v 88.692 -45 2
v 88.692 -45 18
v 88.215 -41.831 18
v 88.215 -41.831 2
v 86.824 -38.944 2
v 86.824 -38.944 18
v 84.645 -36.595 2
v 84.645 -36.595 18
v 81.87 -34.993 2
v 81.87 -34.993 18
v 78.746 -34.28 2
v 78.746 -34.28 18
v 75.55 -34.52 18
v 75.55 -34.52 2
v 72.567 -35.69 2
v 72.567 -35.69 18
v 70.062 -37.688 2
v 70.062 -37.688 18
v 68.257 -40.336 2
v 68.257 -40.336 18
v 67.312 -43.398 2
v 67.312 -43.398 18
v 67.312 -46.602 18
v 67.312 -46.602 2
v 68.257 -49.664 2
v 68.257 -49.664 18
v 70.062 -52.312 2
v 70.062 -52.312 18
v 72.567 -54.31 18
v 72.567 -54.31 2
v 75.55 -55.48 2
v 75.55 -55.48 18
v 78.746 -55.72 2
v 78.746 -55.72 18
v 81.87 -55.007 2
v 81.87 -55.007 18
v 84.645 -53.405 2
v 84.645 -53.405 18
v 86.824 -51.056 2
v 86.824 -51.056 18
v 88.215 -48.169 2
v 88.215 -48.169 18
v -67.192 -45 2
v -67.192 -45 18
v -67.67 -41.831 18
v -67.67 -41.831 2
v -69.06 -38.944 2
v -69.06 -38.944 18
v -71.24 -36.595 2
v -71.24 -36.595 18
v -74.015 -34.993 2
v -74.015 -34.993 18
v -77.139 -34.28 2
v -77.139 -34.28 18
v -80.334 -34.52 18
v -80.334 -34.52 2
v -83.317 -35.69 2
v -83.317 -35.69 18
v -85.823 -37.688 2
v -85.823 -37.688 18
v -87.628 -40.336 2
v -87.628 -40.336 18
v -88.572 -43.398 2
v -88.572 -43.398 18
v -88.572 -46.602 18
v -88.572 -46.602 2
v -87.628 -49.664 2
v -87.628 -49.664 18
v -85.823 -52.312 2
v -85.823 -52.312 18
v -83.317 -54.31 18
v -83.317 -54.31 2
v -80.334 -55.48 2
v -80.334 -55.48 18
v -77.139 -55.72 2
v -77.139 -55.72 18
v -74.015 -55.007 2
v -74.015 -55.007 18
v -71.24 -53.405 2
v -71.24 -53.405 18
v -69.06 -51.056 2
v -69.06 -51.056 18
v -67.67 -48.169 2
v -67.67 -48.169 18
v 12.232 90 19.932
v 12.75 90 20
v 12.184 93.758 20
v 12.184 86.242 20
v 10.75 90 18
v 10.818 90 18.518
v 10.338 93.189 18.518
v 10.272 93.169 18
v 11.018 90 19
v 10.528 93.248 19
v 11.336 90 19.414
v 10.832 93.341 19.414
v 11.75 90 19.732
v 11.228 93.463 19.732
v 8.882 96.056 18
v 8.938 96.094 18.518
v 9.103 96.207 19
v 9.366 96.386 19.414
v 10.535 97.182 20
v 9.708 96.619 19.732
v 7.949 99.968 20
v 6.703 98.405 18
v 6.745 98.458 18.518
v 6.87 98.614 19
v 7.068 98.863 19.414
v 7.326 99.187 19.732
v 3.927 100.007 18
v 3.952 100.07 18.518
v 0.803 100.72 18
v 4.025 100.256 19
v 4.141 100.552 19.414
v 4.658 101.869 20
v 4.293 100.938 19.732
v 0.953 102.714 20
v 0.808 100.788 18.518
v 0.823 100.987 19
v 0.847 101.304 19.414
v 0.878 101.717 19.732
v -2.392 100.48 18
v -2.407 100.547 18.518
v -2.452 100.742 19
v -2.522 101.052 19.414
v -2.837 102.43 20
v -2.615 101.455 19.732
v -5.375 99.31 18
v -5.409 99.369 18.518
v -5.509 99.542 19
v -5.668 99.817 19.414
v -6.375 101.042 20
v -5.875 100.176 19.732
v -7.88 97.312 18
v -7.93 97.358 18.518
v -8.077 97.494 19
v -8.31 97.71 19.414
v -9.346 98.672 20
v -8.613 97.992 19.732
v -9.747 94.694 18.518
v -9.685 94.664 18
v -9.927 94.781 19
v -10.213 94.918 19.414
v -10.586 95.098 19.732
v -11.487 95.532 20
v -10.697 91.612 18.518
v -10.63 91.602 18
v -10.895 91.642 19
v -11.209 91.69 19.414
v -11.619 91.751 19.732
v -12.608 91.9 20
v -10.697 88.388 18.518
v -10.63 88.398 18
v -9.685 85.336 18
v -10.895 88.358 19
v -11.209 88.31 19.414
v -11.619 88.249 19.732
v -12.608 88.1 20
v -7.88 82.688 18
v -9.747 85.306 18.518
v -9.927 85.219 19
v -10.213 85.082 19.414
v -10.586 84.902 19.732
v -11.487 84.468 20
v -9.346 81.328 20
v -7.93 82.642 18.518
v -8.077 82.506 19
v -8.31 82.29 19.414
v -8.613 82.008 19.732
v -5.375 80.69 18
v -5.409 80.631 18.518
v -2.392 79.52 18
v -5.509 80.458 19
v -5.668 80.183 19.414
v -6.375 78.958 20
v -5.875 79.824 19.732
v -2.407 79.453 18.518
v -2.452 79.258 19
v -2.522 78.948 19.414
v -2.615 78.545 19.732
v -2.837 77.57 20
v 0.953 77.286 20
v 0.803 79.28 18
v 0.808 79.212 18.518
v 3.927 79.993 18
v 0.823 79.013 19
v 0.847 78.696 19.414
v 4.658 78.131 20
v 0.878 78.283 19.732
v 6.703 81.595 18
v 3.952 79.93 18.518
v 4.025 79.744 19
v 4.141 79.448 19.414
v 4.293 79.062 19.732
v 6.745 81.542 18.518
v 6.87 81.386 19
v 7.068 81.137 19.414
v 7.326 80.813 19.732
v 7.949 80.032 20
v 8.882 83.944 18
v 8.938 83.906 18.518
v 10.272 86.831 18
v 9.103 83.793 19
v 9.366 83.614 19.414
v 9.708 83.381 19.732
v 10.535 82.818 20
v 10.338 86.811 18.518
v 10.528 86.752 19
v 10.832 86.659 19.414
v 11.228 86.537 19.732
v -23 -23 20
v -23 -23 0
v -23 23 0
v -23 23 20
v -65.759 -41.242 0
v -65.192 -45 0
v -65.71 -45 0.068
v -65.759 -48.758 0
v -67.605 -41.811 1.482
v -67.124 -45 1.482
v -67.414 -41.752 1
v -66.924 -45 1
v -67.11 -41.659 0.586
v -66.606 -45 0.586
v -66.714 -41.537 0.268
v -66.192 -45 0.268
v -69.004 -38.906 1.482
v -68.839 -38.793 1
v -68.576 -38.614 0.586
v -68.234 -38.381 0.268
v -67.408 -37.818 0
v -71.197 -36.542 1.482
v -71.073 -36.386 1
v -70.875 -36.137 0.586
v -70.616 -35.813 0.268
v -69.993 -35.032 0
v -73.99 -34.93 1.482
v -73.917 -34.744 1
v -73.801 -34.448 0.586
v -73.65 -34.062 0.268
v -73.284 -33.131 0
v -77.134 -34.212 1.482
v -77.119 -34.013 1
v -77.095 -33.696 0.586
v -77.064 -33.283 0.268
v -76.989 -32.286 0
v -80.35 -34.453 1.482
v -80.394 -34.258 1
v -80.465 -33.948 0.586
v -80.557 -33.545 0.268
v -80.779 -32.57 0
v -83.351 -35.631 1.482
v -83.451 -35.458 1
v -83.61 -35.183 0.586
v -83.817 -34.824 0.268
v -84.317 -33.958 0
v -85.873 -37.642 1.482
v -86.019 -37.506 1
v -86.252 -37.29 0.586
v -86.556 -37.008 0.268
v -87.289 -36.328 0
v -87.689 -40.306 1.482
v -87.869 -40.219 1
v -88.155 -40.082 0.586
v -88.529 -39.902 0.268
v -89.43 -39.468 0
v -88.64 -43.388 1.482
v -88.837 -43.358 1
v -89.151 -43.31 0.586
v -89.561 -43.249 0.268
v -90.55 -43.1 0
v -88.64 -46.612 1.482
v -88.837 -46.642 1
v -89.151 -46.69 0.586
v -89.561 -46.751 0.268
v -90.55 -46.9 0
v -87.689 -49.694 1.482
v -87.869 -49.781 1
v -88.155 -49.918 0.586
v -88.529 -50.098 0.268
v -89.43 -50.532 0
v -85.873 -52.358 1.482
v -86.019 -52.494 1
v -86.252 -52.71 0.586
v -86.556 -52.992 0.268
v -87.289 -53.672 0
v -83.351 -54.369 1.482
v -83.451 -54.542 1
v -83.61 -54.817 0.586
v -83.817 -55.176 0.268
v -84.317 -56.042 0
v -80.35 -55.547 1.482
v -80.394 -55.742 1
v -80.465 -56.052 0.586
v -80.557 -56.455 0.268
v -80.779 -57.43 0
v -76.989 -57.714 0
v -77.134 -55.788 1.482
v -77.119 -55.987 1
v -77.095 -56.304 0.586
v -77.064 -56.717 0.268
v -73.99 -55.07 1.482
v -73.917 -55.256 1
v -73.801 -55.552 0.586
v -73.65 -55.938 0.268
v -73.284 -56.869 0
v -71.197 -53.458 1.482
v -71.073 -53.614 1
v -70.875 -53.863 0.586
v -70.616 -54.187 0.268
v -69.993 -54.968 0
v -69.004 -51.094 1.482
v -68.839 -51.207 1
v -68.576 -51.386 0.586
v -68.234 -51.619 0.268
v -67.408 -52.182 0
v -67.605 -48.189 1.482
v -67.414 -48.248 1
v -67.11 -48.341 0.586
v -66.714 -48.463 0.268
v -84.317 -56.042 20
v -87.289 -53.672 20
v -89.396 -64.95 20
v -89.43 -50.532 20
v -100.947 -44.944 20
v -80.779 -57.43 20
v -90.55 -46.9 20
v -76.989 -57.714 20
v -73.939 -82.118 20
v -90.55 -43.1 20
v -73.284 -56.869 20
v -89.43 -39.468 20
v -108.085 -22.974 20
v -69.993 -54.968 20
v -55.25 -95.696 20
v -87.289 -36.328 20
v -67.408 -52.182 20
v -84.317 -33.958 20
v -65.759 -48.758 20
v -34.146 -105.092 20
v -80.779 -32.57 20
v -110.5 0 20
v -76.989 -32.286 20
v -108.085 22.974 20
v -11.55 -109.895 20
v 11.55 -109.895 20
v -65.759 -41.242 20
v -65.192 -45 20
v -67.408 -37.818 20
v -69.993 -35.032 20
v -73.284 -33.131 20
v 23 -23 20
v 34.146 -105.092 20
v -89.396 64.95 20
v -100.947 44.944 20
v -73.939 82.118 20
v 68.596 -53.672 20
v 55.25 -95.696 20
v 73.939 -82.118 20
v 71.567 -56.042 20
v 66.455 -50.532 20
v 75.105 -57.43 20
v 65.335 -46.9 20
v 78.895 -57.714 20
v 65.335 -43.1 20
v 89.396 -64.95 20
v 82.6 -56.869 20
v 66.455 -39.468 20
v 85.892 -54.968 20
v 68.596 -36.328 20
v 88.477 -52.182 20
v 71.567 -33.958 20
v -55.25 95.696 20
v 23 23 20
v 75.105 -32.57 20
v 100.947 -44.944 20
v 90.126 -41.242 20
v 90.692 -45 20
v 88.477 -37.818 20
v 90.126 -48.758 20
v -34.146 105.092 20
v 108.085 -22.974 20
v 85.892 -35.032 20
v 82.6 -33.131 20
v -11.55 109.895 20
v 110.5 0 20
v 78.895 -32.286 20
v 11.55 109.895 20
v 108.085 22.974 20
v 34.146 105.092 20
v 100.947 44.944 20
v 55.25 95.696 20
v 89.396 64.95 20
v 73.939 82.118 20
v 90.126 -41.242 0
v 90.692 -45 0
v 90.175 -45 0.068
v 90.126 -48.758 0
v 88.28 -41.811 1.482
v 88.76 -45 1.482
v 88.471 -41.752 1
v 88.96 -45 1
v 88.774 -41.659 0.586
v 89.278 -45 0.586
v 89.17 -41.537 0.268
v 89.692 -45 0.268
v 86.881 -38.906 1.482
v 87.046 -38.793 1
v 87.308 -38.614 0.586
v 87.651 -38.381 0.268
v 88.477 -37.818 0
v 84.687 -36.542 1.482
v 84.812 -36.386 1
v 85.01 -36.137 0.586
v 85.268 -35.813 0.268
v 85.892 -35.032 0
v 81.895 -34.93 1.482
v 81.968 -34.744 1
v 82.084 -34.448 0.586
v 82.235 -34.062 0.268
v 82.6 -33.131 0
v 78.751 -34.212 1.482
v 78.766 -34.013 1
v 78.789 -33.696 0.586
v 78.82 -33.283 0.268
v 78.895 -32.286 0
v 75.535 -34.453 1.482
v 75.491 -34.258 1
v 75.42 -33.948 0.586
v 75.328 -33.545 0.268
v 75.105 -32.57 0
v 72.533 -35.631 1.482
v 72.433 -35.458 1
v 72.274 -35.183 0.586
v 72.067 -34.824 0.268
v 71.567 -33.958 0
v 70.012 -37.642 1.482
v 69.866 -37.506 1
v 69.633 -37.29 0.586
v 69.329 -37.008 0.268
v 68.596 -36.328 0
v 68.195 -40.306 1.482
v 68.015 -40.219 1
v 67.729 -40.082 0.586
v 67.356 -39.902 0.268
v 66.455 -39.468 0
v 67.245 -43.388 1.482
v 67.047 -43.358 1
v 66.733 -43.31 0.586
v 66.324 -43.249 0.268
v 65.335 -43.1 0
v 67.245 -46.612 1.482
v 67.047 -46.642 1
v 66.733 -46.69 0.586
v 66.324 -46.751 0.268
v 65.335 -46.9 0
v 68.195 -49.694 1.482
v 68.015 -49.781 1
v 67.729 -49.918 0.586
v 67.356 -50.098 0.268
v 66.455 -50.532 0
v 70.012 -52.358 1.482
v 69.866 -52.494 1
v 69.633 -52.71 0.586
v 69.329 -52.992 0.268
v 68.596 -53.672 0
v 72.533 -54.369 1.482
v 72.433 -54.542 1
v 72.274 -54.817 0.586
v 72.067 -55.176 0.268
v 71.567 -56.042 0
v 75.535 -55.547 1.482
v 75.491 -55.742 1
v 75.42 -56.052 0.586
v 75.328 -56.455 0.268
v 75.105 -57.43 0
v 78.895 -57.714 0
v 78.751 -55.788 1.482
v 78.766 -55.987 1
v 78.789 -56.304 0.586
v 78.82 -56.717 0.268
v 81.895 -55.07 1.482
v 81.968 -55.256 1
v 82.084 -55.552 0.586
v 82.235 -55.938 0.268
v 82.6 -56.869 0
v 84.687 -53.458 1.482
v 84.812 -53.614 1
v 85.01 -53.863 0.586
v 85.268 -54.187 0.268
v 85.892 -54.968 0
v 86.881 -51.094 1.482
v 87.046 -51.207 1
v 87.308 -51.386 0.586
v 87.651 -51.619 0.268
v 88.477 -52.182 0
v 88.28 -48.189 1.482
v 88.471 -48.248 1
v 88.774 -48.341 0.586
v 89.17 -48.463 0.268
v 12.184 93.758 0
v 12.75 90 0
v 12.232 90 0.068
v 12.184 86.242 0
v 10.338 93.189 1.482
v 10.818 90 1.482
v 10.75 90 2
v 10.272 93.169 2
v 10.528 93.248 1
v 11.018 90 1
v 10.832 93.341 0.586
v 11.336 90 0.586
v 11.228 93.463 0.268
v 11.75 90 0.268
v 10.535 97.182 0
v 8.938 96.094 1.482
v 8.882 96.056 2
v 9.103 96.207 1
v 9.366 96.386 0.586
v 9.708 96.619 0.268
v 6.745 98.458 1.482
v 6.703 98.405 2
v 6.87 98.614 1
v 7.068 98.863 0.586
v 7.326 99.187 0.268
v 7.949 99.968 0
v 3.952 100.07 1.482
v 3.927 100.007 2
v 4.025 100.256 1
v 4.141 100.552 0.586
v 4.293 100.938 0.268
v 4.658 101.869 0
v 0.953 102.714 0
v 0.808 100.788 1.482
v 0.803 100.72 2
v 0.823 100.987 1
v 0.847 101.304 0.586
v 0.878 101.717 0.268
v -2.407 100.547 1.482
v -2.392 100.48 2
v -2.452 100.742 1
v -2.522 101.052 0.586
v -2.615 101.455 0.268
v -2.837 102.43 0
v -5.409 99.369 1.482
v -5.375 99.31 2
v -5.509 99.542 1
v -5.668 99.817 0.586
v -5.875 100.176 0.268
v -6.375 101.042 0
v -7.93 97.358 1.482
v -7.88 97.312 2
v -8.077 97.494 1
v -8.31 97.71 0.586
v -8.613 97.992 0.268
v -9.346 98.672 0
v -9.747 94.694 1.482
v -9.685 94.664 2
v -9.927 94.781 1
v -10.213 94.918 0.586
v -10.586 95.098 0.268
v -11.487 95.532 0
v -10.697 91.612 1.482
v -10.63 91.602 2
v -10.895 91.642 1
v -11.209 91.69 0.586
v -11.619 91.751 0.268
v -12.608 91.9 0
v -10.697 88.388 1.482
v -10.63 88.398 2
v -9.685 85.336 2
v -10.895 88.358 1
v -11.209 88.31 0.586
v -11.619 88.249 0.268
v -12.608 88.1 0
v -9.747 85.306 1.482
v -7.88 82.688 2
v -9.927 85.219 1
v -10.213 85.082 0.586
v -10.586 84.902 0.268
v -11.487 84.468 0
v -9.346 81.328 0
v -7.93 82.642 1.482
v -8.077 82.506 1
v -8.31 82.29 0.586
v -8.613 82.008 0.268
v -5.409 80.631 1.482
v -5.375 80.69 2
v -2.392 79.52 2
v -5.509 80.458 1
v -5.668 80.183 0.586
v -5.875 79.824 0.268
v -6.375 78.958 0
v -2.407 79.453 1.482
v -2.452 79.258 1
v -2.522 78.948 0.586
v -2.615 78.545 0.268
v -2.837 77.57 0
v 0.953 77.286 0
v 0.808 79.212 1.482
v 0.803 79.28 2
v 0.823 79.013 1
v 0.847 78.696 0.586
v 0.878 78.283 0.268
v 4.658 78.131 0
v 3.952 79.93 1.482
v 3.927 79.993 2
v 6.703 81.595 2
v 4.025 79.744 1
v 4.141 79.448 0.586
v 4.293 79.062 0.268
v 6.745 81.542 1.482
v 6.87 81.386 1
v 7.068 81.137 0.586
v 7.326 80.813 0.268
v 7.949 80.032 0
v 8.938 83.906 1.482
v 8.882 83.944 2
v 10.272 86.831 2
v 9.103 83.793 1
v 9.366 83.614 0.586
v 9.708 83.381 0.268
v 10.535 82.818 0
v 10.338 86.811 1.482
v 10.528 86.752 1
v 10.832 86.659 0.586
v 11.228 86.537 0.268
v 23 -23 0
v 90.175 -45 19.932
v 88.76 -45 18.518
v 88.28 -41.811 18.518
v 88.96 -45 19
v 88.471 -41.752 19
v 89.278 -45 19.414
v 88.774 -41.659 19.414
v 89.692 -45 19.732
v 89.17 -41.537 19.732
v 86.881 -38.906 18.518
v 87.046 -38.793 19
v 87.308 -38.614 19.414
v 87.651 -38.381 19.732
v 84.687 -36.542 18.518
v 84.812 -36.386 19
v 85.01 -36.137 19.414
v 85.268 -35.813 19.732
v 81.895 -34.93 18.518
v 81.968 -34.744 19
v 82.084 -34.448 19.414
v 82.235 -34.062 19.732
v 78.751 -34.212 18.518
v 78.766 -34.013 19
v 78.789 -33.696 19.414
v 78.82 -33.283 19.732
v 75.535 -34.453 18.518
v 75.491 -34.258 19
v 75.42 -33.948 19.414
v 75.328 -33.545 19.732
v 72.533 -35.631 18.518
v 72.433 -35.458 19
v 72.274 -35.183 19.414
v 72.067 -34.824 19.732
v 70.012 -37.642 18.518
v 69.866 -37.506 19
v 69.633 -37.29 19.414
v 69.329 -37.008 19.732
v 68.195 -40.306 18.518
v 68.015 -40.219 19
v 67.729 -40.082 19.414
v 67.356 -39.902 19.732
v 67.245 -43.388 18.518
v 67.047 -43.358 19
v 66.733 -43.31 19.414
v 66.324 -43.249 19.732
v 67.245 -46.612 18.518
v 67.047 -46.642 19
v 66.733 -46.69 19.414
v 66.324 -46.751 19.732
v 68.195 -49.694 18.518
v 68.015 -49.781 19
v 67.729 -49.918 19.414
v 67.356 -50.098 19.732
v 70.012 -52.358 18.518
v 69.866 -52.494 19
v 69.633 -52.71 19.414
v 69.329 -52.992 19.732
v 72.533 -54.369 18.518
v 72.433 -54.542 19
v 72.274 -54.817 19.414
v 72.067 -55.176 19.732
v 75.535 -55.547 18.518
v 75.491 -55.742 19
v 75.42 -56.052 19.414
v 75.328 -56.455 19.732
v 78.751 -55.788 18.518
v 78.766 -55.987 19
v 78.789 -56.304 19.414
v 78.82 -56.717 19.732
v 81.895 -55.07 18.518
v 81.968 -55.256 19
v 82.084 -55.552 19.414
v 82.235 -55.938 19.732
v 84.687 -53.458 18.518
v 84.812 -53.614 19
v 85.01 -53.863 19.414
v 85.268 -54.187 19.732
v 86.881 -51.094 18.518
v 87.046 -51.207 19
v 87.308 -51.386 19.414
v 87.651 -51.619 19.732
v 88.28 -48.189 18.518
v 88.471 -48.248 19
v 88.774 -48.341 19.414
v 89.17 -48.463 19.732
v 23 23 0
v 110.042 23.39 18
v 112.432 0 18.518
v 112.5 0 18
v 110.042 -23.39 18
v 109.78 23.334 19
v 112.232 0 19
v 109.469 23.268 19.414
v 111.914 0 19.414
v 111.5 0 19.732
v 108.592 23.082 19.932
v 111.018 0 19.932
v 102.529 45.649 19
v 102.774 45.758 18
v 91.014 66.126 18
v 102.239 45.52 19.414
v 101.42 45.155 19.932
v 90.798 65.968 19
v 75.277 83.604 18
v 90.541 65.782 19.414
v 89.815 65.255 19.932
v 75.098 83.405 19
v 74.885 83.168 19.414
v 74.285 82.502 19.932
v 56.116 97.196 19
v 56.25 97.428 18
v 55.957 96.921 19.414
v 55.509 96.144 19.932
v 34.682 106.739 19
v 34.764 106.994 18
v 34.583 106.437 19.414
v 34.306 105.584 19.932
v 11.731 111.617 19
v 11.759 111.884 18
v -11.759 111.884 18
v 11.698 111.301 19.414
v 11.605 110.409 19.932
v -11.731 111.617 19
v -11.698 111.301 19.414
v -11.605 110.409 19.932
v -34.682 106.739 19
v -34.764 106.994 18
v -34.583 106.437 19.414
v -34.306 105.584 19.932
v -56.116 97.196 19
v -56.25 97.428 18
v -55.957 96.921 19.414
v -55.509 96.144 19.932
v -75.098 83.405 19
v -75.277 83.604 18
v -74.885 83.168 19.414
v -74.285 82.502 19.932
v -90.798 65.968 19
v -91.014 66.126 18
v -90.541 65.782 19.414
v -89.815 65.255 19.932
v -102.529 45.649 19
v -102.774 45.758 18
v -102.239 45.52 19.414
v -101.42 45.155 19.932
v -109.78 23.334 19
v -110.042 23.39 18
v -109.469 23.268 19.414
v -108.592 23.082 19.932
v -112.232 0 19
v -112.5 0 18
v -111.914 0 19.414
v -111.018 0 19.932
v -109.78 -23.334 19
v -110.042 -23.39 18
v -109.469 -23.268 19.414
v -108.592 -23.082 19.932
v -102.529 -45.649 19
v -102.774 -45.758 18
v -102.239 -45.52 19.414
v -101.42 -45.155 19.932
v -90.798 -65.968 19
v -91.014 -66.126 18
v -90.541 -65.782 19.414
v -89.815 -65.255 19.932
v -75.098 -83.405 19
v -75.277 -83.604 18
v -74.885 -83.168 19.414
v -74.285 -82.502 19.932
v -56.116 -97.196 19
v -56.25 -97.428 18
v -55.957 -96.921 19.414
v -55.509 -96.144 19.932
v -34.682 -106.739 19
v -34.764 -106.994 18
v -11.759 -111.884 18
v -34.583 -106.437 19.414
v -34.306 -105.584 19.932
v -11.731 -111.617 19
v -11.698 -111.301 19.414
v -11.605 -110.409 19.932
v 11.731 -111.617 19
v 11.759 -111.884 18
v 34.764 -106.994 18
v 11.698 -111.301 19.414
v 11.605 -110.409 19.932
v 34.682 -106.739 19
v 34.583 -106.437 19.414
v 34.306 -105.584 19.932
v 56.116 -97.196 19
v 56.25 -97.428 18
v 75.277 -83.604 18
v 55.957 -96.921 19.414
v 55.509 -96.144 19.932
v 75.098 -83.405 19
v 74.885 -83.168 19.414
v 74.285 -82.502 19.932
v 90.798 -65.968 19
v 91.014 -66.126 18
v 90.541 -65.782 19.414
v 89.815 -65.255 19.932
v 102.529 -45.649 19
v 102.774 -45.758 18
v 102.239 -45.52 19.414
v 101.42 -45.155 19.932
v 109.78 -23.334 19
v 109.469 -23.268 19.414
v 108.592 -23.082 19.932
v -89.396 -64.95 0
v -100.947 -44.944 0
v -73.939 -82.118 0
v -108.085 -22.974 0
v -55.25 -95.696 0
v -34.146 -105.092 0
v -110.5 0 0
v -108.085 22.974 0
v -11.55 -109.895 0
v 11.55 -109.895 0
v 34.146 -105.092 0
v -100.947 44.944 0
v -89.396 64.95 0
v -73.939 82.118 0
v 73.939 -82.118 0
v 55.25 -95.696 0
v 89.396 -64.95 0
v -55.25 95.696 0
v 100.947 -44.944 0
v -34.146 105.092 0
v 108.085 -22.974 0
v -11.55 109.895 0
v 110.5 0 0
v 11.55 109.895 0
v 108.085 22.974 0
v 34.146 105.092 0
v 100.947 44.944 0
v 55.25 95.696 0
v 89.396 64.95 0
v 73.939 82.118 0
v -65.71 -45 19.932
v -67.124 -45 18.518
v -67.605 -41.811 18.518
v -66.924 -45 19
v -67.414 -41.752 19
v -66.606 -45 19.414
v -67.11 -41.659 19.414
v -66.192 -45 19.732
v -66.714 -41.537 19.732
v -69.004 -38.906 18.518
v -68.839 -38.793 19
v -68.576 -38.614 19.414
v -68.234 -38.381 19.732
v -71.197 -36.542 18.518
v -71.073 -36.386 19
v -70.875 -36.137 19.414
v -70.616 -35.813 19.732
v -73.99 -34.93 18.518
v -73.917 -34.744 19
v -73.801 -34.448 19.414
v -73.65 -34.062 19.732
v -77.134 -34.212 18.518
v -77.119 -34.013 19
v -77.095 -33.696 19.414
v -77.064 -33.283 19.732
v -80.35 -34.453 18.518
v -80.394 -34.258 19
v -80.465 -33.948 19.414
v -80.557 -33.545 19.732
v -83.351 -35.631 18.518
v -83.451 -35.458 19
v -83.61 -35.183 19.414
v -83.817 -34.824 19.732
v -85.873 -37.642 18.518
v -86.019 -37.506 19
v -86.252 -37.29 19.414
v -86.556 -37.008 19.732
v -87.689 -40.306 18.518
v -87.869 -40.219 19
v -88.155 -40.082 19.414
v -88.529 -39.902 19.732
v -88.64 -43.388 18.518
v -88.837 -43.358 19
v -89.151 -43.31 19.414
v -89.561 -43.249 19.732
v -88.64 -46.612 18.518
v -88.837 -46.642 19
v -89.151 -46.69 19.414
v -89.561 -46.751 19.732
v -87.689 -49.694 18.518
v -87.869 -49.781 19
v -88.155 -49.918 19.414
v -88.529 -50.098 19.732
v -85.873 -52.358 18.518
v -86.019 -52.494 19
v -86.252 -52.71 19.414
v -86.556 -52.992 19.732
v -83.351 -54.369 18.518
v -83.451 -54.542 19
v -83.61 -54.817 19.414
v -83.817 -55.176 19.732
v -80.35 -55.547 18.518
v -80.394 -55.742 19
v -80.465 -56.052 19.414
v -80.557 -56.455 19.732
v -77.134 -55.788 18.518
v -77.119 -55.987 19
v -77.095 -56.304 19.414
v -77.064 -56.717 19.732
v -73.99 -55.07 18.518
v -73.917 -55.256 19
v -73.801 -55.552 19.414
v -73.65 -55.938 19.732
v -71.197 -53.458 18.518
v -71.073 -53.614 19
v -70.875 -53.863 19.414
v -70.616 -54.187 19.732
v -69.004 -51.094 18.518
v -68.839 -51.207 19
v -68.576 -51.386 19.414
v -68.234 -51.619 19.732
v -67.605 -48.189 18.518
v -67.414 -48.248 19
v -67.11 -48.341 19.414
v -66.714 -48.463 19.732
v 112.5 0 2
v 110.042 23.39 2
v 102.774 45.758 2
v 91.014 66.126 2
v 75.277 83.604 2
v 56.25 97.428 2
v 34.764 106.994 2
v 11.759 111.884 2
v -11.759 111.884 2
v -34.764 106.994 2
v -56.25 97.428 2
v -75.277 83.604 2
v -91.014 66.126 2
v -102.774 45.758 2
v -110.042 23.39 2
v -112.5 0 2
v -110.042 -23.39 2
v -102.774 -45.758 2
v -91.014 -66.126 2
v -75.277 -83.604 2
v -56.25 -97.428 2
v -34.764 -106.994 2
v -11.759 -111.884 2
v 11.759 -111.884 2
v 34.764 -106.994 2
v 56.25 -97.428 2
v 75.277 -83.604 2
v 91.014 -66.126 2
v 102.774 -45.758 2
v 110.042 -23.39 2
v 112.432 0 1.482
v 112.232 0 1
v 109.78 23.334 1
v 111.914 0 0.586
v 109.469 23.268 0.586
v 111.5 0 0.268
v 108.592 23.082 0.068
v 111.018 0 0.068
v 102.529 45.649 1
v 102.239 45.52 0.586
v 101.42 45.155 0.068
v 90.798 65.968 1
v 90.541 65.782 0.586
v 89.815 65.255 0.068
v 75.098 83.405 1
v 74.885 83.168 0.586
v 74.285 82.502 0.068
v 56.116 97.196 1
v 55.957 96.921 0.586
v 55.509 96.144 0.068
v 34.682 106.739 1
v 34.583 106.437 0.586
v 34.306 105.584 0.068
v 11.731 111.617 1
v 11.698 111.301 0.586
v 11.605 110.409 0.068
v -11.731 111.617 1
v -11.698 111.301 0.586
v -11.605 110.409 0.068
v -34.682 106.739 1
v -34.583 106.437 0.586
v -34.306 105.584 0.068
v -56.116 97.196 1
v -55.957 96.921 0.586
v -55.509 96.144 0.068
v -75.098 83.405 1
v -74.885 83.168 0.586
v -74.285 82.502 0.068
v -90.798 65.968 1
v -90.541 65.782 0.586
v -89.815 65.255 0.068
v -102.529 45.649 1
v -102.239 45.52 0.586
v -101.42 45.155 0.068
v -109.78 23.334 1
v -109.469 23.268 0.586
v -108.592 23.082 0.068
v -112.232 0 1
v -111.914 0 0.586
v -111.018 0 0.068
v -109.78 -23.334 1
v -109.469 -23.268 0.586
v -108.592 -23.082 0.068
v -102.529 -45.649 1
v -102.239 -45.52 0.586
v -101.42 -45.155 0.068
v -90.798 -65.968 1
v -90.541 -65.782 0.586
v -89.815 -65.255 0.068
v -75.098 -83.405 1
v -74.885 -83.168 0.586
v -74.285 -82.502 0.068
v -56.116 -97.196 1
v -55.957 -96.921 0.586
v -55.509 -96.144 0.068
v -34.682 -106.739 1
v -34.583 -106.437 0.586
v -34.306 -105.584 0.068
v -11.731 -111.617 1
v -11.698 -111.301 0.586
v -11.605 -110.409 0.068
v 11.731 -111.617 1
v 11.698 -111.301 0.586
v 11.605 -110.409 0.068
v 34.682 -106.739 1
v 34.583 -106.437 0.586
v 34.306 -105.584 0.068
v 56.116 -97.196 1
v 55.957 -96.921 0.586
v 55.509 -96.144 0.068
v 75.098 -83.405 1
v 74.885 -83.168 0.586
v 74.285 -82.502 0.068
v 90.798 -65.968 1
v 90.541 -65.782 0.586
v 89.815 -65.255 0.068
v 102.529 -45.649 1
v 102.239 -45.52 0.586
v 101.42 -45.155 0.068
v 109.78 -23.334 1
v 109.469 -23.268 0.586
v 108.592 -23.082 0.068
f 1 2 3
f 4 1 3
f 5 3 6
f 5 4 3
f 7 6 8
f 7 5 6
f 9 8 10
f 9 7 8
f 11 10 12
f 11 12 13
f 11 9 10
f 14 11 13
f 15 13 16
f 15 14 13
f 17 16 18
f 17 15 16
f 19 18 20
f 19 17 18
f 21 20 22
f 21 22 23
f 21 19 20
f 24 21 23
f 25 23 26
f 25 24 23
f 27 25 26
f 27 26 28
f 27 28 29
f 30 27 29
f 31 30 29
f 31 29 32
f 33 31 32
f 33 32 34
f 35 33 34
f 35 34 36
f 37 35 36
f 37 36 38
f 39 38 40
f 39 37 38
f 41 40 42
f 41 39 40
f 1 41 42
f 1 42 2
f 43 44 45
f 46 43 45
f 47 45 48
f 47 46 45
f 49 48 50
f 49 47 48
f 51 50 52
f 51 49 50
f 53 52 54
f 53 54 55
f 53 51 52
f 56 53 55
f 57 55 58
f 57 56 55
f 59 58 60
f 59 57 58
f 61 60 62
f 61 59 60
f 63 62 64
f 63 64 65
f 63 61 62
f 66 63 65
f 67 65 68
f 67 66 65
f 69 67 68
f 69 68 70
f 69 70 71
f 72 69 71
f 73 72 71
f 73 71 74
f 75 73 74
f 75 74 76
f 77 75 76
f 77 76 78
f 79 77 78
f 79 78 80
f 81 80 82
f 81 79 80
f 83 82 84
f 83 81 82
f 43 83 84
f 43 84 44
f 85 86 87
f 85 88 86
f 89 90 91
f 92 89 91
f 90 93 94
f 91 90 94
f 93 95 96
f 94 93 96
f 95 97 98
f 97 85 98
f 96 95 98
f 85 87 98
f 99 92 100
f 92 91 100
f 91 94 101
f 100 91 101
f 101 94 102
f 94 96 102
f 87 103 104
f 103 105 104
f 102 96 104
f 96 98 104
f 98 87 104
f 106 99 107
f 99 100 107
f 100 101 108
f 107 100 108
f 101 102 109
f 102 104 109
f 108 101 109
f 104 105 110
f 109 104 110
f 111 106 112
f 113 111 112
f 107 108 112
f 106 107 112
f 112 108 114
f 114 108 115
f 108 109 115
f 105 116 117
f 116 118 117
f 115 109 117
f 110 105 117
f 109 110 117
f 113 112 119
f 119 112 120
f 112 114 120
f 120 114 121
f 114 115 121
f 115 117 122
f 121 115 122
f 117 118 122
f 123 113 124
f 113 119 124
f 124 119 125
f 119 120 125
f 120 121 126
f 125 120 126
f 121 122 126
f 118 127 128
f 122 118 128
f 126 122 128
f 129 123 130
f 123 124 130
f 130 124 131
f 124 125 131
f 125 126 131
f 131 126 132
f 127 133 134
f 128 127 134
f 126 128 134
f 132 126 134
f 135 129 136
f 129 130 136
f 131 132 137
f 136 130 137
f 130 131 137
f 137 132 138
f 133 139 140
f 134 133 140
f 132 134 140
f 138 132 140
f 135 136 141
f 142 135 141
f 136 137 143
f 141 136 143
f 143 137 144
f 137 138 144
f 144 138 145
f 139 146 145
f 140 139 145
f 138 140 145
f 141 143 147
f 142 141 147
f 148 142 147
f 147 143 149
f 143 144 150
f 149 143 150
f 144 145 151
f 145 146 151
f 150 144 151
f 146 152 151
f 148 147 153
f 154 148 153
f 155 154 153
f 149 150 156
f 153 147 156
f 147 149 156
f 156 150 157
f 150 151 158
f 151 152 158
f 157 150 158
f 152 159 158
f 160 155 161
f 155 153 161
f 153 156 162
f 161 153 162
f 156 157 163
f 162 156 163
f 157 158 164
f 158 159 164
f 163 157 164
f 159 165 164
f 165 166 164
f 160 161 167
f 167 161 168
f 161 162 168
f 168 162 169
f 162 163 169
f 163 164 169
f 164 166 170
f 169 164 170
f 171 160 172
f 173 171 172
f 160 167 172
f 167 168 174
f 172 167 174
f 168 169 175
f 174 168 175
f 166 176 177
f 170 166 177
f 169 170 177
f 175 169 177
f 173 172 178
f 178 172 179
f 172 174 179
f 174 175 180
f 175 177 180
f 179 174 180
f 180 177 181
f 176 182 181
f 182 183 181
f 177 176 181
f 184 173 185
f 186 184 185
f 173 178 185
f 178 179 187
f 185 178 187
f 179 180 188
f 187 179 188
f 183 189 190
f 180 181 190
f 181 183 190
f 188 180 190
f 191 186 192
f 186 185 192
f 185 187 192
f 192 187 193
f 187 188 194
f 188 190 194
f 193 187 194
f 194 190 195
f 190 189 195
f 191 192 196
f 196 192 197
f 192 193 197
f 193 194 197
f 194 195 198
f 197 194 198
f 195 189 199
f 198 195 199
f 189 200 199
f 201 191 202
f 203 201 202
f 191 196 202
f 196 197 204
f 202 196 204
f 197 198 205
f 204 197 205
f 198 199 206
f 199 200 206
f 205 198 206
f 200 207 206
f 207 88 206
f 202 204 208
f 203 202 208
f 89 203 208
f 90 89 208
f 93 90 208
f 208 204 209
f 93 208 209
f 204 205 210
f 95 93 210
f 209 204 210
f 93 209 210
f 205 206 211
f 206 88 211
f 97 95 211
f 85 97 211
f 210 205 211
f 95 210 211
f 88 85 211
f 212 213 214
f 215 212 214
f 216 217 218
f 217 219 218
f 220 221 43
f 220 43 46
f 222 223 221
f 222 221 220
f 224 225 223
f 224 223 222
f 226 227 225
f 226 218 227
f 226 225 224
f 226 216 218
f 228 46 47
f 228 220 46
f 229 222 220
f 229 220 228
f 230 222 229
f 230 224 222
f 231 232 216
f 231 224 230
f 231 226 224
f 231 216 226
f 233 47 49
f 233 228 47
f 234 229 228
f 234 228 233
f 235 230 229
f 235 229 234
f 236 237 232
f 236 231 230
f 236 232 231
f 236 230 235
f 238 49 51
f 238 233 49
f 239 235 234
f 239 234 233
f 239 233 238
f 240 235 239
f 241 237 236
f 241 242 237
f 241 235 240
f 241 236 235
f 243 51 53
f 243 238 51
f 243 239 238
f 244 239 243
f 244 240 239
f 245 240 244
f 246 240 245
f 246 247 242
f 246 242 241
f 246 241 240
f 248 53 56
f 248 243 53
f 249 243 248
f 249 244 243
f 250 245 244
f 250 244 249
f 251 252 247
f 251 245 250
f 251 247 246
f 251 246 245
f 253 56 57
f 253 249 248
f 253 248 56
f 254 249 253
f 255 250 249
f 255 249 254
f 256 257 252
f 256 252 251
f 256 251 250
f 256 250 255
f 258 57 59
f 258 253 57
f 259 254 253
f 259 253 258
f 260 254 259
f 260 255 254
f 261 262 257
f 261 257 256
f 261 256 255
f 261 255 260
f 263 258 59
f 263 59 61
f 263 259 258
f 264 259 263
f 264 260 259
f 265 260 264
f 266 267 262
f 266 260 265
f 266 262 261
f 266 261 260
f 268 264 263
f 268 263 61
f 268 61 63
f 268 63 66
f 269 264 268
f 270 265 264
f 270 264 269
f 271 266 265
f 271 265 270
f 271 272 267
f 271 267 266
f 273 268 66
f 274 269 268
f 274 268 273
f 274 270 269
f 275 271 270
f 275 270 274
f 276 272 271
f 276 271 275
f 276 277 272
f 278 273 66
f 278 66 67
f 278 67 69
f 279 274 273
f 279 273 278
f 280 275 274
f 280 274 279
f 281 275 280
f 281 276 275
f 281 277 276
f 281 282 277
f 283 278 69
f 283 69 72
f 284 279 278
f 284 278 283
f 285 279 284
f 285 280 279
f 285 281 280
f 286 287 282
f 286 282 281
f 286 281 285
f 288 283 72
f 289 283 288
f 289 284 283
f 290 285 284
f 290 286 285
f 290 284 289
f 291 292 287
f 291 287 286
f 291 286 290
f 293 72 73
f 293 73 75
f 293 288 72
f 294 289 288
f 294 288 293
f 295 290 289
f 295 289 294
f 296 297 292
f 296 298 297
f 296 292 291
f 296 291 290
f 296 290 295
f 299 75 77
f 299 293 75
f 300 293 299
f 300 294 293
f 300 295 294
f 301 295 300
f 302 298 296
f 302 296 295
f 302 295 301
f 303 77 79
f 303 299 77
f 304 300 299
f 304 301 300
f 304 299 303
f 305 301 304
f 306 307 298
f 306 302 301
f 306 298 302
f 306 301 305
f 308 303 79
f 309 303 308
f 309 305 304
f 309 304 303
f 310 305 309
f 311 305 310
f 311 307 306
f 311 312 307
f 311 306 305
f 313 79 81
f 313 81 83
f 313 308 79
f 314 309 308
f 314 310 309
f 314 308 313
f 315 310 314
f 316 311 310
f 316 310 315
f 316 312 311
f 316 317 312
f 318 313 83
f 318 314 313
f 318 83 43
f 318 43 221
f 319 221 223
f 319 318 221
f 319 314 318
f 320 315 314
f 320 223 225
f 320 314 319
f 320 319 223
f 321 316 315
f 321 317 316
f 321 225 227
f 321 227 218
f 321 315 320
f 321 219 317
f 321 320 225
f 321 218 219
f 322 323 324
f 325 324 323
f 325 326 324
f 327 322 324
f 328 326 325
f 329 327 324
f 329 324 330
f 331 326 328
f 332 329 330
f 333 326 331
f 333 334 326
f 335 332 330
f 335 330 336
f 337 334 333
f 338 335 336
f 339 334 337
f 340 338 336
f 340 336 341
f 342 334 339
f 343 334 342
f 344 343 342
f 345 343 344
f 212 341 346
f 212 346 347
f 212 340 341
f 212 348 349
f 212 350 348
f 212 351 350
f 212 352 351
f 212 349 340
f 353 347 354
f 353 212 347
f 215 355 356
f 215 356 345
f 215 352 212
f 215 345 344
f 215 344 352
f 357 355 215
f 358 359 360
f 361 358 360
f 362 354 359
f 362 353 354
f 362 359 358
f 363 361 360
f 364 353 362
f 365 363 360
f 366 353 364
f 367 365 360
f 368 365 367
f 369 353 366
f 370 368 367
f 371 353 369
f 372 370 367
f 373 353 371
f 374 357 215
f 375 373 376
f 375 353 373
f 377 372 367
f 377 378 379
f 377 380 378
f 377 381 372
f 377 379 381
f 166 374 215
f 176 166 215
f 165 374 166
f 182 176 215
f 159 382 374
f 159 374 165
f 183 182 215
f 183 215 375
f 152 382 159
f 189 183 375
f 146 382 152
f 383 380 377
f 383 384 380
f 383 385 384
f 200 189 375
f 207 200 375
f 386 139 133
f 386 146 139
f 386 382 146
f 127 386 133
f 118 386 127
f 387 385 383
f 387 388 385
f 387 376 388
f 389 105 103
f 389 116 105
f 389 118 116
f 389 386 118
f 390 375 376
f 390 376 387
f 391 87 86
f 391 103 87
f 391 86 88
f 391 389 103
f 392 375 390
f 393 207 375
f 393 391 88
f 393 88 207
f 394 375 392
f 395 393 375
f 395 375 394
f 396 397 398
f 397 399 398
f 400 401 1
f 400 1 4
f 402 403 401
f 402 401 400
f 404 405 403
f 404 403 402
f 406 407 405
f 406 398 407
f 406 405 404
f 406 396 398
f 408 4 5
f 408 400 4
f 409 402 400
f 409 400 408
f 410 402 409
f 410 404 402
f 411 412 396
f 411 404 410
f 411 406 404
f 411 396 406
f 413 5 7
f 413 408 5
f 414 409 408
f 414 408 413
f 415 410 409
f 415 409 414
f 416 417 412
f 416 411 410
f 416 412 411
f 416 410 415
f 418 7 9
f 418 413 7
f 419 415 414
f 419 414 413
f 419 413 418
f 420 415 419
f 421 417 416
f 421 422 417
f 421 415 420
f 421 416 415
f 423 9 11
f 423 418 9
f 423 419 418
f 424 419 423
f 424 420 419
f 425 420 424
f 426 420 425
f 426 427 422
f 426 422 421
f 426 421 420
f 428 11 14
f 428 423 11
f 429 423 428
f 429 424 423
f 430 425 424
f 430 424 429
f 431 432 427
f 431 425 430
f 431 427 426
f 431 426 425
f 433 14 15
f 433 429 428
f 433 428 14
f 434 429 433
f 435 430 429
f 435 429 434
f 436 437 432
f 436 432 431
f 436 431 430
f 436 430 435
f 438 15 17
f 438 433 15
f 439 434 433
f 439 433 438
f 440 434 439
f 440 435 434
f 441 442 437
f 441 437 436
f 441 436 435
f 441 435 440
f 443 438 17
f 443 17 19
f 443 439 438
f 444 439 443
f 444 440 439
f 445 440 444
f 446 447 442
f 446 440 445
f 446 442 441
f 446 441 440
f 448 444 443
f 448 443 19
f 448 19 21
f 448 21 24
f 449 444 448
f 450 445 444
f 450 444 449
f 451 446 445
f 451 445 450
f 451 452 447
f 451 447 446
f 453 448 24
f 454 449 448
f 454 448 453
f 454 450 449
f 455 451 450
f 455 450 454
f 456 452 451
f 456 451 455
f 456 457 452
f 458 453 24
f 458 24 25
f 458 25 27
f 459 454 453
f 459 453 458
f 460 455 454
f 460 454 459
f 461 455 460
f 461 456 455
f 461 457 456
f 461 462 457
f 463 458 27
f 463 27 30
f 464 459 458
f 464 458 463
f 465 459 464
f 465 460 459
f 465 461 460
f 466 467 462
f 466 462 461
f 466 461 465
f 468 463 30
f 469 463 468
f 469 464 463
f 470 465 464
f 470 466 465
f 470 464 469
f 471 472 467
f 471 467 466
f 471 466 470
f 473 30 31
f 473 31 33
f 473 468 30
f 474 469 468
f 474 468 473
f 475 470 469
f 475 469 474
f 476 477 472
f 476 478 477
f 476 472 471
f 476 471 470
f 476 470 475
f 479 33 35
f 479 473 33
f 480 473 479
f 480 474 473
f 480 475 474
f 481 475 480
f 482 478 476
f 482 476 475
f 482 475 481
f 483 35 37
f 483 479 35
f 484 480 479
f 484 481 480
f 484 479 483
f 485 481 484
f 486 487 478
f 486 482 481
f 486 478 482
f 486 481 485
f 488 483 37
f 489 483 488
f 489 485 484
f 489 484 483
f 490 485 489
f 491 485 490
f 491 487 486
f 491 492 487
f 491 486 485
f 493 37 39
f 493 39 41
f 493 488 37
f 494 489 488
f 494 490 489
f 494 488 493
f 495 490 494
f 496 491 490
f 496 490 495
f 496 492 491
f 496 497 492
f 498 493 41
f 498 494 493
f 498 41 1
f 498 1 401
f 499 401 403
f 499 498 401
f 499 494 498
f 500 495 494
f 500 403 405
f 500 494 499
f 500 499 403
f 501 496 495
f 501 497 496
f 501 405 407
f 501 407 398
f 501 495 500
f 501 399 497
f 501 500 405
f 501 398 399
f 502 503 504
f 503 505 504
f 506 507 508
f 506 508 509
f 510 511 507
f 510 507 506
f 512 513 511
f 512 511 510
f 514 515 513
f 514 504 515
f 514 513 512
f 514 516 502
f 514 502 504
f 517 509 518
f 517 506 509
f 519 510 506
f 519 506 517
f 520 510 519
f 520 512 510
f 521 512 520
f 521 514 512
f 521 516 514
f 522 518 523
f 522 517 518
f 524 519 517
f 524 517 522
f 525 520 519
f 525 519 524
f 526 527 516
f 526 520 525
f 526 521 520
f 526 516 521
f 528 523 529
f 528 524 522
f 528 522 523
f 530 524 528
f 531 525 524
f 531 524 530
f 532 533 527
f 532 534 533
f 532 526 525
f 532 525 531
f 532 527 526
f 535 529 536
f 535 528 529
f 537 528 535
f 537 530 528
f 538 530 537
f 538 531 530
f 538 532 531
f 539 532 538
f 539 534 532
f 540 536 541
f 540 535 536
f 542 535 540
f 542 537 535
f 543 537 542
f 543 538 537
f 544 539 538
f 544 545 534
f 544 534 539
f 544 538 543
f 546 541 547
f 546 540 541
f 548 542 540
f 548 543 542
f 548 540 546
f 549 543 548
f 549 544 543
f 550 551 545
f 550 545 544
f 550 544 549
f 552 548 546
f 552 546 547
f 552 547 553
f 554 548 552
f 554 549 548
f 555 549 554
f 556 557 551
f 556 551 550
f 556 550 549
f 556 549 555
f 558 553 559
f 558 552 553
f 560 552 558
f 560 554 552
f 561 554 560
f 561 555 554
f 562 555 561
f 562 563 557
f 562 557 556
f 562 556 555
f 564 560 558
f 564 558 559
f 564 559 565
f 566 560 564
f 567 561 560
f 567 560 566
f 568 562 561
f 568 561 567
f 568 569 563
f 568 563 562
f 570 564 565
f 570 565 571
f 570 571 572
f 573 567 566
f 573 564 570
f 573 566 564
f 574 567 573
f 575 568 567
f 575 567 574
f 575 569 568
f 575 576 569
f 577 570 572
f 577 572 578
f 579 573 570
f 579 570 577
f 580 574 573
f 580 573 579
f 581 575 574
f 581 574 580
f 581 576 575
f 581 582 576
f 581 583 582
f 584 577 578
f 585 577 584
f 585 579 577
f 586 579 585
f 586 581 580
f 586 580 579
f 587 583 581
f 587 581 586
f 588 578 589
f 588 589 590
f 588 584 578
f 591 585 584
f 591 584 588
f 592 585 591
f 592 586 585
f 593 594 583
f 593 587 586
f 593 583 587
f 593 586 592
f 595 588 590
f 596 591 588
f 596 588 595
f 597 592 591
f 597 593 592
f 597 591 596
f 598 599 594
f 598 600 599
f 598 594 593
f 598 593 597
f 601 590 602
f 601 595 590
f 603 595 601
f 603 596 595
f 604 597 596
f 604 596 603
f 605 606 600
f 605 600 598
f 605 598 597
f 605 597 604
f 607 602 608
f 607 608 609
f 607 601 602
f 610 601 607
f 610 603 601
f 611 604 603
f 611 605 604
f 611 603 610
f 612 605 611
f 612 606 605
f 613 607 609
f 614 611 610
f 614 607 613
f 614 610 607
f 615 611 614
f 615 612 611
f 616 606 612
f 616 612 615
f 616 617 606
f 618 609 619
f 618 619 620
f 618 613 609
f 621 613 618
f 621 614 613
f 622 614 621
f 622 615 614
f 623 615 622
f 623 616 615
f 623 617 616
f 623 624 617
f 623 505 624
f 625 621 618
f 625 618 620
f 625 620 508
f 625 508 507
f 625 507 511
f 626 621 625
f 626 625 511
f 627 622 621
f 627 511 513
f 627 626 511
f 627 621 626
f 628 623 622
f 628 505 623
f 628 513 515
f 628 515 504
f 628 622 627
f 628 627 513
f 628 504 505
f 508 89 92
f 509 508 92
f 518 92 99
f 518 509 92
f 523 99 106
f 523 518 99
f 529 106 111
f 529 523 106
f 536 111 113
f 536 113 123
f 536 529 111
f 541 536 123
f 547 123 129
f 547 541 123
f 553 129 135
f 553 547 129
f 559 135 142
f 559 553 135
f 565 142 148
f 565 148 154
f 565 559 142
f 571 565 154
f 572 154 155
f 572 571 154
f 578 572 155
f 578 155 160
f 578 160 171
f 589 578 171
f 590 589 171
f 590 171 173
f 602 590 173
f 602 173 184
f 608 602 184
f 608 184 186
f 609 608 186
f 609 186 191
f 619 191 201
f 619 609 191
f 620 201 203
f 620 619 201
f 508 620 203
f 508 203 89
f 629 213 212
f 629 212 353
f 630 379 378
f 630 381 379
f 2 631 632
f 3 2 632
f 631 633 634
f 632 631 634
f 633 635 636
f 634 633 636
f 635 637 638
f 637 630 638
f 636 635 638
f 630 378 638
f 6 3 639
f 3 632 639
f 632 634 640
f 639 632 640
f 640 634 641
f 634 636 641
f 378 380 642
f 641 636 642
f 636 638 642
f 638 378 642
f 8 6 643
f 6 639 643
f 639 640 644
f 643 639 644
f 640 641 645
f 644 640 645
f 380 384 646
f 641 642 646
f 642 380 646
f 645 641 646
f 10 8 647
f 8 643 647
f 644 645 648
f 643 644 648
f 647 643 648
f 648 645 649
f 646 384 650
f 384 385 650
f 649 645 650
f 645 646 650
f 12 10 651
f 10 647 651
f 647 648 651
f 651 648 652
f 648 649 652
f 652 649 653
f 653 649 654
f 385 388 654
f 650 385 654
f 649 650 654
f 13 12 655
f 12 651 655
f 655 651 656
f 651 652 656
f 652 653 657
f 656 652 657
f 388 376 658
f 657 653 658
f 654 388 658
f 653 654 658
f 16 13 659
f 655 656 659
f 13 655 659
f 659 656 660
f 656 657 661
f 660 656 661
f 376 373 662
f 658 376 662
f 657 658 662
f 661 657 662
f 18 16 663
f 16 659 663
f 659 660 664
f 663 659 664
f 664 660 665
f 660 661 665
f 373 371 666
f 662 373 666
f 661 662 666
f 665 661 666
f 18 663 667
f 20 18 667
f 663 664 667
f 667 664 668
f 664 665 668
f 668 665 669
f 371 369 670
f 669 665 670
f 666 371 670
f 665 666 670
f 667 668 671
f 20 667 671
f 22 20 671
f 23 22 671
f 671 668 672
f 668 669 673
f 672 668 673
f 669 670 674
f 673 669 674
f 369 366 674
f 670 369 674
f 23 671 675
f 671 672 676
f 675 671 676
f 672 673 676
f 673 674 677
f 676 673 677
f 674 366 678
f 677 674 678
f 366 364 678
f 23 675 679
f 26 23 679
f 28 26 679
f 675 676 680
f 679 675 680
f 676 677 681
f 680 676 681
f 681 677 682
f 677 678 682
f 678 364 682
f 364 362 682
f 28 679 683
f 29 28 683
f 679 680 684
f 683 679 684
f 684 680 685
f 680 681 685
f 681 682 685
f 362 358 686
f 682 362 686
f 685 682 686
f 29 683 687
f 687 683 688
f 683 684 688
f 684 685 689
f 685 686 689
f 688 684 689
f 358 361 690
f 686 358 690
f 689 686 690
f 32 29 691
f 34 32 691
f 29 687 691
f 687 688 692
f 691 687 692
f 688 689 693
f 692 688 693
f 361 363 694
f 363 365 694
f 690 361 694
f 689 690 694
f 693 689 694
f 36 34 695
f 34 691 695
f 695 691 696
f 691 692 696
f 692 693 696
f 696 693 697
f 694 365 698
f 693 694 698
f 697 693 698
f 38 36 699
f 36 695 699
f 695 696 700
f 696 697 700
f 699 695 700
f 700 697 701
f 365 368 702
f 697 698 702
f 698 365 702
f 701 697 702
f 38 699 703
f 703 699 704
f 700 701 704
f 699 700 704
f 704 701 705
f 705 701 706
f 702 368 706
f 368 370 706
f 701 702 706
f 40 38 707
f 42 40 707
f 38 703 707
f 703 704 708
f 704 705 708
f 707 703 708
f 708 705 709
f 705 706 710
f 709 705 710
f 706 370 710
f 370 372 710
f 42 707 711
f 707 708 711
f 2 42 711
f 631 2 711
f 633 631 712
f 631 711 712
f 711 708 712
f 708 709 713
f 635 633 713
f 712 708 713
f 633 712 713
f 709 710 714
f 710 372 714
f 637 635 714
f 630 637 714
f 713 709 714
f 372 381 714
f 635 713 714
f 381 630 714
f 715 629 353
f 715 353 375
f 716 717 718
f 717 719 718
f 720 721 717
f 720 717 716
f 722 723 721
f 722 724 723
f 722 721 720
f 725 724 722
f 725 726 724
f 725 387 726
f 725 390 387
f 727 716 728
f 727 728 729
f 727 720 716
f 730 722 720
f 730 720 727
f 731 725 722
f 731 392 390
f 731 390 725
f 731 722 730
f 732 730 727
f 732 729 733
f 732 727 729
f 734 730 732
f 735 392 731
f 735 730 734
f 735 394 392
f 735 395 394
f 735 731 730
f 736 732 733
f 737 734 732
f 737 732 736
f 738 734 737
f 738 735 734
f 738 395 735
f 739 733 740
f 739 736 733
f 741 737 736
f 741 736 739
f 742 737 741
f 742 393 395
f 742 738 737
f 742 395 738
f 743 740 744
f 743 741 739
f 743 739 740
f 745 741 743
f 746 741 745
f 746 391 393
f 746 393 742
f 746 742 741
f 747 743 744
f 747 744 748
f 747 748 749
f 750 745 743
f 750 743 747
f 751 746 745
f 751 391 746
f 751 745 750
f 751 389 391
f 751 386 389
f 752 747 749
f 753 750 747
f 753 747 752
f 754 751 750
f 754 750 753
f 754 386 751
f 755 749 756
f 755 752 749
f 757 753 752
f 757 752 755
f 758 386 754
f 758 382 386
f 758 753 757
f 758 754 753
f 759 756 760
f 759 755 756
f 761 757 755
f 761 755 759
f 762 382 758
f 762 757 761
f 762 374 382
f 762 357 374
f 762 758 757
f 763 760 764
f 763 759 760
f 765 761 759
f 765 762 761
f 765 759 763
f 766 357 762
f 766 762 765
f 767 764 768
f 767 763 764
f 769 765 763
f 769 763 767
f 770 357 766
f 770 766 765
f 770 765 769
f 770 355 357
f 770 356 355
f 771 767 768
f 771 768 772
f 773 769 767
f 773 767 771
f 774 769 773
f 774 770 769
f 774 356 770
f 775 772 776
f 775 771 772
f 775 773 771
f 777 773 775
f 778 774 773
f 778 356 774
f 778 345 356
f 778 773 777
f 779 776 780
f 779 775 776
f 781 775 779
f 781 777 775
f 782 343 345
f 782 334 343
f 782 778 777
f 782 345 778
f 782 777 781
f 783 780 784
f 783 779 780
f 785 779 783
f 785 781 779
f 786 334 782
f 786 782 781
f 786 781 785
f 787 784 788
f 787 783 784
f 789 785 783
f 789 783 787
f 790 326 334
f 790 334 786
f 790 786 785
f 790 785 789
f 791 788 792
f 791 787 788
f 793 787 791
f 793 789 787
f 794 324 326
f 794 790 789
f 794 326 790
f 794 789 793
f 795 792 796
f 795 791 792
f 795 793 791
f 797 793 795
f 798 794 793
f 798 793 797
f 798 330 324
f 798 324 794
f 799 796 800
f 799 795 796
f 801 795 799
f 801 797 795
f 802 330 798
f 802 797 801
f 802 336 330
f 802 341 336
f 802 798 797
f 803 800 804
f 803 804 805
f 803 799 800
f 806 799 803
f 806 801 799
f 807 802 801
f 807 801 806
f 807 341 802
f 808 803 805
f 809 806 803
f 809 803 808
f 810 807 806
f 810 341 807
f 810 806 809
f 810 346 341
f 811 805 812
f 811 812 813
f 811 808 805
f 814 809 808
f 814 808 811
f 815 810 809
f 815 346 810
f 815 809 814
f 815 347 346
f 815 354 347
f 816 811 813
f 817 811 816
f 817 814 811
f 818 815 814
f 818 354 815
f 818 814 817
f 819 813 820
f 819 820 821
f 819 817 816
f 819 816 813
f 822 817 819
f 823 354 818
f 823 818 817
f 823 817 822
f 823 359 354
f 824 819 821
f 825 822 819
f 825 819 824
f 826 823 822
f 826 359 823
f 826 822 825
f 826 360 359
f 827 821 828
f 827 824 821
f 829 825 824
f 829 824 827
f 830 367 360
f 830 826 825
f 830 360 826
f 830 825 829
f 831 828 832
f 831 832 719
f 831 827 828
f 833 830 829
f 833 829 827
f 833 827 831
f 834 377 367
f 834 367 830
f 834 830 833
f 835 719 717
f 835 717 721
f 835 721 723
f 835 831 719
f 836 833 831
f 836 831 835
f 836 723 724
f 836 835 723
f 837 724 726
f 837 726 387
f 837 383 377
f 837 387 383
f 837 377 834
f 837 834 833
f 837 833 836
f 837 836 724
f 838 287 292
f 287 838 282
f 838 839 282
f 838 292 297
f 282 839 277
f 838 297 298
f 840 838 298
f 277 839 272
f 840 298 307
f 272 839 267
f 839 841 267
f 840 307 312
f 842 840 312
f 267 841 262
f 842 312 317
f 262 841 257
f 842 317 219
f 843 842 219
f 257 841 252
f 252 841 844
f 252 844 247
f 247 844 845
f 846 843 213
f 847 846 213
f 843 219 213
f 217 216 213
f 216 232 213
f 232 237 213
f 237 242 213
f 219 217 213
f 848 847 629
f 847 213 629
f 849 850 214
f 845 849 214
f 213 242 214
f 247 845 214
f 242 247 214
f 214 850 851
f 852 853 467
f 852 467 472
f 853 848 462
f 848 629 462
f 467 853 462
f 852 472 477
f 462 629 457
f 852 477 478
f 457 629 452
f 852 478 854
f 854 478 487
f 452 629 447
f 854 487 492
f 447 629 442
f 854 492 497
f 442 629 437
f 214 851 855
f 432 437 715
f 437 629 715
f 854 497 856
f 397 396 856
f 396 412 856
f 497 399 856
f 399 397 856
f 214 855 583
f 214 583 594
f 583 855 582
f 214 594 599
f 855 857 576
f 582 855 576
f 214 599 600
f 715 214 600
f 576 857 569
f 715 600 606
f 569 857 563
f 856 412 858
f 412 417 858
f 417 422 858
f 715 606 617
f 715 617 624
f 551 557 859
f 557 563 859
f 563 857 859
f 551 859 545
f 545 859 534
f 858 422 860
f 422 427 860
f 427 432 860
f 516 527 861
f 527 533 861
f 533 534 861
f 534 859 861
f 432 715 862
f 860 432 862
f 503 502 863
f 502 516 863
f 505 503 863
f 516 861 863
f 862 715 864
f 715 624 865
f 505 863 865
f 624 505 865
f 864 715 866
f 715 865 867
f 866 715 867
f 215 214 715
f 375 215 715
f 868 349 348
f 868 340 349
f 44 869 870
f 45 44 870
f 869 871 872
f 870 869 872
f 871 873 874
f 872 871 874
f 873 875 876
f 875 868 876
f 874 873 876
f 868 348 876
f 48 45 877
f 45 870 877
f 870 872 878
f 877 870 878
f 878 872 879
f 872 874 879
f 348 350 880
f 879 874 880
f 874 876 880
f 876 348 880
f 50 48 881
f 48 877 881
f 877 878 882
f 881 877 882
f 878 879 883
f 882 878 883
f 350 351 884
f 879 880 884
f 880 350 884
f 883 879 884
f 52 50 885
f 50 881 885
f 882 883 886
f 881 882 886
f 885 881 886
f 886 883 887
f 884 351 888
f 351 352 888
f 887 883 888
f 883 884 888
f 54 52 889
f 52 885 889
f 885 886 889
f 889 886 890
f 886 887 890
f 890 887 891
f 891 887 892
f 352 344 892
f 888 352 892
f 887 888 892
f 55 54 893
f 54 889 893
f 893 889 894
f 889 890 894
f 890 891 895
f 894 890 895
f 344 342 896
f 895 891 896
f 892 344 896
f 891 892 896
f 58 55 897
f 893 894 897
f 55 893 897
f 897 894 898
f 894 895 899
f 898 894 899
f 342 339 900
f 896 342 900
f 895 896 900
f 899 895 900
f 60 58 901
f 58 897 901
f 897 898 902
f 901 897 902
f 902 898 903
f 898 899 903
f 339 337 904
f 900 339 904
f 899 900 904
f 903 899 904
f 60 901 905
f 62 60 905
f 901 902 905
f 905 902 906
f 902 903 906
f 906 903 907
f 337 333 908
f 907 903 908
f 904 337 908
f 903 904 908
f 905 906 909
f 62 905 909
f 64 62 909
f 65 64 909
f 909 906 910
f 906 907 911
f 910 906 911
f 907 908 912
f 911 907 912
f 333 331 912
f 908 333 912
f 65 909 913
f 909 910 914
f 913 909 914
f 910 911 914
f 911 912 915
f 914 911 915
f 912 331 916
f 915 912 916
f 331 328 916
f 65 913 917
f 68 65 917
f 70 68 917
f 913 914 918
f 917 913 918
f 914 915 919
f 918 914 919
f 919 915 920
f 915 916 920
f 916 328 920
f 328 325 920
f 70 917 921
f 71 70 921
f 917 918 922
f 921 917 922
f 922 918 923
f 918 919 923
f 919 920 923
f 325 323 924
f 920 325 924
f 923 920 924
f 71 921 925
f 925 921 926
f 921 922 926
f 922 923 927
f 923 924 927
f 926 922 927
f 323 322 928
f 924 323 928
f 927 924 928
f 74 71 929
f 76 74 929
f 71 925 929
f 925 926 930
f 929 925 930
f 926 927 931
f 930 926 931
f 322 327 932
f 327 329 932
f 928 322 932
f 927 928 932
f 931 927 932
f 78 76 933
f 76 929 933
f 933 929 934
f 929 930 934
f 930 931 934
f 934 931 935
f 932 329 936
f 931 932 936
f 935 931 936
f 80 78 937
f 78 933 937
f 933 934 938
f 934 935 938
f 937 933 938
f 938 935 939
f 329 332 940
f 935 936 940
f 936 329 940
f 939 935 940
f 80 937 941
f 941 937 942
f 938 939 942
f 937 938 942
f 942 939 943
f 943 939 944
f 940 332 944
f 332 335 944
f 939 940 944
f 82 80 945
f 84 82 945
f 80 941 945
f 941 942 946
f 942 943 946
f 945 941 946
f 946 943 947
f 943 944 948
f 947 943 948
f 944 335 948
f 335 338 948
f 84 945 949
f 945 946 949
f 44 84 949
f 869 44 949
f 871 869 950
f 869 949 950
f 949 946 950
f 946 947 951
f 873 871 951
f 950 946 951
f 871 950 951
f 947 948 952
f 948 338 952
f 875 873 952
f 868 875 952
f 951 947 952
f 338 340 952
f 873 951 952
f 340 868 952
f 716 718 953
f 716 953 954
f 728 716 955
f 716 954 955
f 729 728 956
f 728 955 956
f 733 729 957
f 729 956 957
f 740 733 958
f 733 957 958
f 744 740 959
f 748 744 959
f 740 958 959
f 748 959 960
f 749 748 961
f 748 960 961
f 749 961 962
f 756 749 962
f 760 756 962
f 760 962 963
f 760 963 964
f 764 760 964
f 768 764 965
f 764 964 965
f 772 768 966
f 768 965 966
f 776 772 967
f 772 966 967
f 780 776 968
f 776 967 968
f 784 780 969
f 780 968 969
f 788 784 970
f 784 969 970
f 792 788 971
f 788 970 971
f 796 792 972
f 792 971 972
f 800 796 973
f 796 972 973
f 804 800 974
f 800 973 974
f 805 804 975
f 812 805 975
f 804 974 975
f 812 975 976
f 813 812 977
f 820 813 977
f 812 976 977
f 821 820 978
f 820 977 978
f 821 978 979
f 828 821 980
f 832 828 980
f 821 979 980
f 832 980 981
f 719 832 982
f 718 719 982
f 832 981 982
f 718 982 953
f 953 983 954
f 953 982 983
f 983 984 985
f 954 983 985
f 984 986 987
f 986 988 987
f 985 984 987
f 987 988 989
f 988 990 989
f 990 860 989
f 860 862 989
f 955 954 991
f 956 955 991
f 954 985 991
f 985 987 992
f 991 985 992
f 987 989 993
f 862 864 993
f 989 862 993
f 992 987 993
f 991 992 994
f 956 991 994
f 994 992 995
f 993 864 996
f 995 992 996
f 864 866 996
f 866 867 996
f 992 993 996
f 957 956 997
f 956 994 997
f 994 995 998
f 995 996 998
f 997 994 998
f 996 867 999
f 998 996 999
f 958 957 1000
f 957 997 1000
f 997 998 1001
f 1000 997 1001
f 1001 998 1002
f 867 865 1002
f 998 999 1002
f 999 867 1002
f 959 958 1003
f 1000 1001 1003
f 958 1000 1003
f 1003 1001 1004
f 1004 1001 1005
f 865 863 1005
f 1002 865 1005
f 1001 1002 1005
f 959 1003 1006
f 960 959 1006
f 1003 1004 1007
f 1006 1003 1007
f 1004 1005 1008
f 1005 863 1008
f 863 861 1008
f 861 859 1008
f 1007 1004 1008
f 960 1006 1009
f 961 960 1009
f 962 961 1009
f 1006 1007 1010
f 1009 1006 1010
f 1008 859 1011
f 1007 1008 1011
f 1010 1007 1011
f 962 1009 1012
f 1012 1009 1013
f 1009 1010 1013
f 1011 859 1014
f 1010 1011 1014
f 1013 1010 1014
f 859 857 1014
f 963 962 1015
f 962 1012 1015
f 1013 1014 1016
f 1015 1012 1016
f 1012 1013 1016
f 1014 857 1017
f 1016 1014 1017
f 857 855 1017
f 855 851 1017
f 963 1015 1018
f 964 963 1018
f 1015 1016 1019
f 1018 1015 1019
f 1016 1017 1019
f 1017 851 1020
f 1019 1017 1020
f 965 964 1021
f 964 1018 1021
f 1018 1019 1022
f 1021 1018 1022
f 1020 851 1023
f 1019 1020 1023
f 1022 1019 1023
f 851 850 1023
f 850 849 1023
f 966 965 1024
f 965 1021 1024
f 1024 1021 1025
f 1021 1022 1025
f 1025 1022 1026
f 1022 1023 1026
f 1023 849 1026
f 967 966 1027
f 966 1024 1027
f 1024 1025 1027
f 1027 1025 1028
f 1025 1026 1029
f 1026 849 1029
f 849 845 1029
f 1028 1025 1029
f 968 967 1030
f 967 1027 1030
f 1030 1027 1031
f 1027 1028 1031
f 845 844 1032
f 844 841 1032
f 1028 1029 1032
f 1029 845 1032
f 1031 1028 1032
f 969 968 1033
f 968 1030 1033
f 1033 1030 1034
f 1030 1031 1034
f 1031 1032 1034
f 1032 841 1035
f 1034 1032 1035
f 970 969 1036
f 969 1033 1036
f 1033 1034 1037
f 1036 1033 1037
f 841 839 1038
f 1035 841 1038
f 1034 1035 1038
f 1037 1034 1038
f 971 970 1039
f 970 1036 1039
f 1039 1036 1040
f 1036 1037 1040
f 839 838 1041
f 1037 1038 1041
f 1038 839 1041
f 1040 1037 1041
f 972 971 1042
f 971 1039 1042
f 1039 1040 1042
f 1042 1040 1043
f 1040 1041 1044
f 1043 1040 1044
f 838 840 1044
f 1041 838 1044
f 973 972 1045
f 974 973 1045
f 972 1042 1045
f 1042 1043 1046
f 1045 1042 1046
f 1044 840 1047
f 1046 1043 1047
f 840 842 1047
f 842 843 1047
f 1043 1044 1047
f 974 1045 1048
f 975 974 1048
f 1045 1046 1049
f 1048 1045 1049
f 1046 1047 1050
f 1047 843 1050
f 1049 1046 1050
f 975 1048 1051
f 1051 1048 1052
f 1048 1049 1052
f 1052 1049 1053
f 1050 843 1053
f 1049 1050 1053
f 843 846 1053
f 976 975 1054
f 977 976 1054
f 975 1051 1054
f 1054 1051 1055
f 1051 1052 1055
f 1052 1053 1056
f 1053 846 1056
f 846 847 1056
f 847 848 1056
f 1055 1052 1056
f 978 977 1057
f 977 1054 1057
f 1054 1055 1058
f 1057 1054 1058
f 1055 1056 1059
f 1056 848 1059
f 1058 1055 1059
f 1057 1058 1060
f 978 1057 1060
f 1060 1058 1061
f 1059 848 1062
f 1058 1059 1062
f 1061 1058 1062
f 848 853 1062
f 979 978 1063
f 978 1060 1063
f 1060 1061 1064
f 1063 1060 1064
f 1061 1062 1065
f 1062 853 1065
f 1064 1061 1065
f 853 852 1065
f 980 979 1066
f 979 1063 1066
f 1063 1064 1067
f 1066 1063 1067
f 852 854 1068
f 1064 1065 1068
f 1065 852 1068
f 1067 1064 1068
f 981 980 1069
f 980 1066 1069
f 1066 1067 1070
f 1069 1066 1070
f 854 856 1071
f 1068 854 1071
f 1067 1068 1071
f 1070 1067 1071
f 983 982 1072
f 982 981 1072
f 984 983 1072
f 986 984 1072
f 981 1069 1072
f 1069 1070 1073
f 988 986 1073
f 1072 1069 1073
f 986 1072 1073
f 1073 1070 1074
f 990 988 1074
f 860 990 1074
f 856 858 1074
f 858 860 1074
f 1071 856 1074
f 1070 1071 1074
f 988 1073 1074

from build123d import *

# Parameters (mm, degrees)
SKETCH1_R           = 112.5
SKETCH1_R_2         = 10.75
SKETCH1_W           = 46
SKETCH1_H           = 46
BOSS_EXTRUDE1_DEPTH = 20
FILLET9_R           = 2


with BuildPart() as part:
    # Sketch1 → Boss-Extrude1 (new body)
    with BuildSketch(Plane.XY):
        Circle(SKETCH1_R)
        with Locations((0, 90)):
            Circle(SKETCH1_R_2, mode=Mode.SUBTRACT)
        with Locations((77.942286341, -45)):
            Circle(SKETCH1_R_2, mode=Mode.SUBTRACT)
        with Locations((-77.942286341, -45)):
            Circle(SKETCH1_R_2, mode=Mode.SUBTRACT)
        Rectangle(SKETCH1_W, SKETCH1_H, mode=Mode.SUBTRACT)
    extrude(amount=BOSS_EXTRUDE1_DEPTH)

    # Fillet9
    fillet9_edges = [part.edges().sort_by_distance(p)[0] for p in [
        (-10.75, 90, 0),
        (-10.75, 90, 20),
        (-112.5, 0, 0),
        (67.192286341, -45, 0),
        (67.192286341, -45, 20),
        (-88.692286341, -45, 0),
        (-88.692286341, -45, 20),
        (-112.5, 0, 20),
    ]]
    fillet(fillet9_edges, radius=FILLET9_R)


solid = part.part
